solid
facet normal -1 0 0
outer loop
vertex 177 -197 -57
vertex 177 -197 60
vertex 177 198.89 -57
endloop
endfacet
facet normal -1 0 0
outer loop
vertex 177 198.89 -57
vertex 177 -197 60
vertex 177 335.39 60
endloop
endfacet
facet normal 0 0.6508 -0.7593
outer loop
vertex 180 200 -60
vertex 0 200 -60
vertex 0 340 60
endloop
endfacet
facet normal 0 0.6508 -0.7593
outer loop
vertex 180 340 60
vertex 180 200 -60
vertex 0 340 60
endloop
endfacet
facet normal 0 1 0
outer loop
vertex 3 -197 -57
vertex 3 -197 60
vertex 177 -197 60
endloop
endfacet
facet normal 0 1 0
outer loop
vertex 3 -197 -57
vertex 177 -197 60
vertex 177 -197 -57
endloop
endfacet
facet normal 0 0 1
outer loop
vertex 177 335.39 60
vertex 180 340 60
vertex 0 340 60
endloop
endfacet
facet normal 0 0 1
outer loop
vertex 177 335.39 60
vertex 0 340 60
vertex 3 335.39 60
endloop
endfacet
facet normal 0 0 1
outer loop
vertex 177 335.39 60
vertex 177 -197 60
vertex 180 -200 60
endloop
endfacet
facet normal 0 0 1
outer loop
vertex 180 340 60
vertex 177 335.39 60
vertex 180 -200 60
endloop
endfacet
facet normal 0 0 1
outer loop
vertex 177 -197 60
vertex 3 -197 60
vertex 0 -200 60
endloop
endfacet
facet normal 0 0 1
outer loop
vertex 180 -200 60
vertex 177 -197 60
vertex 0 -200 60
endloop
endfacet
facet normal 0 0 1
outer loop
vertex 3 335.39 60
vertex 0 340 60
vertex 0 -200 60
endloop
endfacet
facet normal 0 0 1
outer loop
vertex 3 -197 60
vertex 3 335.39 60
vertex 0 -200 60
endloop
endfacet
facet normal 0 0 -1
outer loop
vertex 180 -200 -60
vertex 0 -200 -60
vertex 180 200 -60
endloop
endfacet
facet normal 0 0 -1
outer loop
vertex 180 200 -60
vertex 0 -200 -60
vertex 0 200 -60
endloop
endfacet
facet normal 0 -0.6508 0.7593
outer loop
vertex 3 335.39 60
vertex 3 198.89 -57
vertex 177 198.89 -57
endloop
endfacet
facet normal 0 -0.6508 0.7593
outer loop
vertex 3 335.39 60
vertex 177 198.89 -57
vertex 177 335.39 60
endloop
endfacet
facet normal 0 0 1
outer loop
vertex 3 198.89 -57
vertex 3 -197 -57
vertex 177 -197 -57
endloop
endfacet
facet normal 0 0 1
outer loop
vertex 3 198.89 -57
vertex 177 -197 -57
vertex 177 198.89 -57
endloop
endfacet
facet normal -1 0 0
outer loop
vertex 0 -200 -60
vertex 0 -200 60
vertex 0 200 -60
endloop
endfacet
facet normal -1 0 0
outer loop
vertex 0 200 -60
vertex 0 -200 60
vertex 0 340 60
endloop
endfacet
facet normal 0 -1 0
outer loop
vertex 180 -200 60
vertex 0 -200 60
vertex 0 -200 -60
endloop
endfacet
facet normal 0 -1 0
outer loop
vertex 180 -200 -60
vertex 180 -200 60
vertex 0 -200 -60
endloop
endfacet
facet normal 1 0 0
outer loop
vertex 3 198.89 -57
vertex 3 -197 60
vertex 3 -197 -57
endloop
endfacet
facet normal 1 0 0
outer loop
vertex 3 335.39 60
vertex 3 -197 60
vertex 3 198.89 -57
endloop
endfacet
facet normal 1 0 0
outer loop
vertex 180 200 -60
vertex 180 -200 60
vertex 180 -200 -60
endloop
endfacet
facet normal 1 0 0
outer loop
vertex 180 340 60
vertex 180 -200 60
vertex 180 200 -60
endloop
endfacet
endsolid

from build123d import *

# Parameters (mm, degrees)
F1_DEPTH = 180
F2_T     = -3


with BuildPart() as f1:
    # F0 (on Right) → F1 (new body)
    with BuildSketch(Plane.YZ):
        Polygon((-200, 60), (-200, -60), (200, -60), (340, 60), (200, 60), align=None)
    extrude(amount=F1_DEPTH)

    # F2
    f2_openings = [f1.faces().sort_by_distance(p)[0] for p in [
        (90, 70, 60),
    ]]
    offset(amount=F2_T, openings=f2_openings)


solid = f1.part
